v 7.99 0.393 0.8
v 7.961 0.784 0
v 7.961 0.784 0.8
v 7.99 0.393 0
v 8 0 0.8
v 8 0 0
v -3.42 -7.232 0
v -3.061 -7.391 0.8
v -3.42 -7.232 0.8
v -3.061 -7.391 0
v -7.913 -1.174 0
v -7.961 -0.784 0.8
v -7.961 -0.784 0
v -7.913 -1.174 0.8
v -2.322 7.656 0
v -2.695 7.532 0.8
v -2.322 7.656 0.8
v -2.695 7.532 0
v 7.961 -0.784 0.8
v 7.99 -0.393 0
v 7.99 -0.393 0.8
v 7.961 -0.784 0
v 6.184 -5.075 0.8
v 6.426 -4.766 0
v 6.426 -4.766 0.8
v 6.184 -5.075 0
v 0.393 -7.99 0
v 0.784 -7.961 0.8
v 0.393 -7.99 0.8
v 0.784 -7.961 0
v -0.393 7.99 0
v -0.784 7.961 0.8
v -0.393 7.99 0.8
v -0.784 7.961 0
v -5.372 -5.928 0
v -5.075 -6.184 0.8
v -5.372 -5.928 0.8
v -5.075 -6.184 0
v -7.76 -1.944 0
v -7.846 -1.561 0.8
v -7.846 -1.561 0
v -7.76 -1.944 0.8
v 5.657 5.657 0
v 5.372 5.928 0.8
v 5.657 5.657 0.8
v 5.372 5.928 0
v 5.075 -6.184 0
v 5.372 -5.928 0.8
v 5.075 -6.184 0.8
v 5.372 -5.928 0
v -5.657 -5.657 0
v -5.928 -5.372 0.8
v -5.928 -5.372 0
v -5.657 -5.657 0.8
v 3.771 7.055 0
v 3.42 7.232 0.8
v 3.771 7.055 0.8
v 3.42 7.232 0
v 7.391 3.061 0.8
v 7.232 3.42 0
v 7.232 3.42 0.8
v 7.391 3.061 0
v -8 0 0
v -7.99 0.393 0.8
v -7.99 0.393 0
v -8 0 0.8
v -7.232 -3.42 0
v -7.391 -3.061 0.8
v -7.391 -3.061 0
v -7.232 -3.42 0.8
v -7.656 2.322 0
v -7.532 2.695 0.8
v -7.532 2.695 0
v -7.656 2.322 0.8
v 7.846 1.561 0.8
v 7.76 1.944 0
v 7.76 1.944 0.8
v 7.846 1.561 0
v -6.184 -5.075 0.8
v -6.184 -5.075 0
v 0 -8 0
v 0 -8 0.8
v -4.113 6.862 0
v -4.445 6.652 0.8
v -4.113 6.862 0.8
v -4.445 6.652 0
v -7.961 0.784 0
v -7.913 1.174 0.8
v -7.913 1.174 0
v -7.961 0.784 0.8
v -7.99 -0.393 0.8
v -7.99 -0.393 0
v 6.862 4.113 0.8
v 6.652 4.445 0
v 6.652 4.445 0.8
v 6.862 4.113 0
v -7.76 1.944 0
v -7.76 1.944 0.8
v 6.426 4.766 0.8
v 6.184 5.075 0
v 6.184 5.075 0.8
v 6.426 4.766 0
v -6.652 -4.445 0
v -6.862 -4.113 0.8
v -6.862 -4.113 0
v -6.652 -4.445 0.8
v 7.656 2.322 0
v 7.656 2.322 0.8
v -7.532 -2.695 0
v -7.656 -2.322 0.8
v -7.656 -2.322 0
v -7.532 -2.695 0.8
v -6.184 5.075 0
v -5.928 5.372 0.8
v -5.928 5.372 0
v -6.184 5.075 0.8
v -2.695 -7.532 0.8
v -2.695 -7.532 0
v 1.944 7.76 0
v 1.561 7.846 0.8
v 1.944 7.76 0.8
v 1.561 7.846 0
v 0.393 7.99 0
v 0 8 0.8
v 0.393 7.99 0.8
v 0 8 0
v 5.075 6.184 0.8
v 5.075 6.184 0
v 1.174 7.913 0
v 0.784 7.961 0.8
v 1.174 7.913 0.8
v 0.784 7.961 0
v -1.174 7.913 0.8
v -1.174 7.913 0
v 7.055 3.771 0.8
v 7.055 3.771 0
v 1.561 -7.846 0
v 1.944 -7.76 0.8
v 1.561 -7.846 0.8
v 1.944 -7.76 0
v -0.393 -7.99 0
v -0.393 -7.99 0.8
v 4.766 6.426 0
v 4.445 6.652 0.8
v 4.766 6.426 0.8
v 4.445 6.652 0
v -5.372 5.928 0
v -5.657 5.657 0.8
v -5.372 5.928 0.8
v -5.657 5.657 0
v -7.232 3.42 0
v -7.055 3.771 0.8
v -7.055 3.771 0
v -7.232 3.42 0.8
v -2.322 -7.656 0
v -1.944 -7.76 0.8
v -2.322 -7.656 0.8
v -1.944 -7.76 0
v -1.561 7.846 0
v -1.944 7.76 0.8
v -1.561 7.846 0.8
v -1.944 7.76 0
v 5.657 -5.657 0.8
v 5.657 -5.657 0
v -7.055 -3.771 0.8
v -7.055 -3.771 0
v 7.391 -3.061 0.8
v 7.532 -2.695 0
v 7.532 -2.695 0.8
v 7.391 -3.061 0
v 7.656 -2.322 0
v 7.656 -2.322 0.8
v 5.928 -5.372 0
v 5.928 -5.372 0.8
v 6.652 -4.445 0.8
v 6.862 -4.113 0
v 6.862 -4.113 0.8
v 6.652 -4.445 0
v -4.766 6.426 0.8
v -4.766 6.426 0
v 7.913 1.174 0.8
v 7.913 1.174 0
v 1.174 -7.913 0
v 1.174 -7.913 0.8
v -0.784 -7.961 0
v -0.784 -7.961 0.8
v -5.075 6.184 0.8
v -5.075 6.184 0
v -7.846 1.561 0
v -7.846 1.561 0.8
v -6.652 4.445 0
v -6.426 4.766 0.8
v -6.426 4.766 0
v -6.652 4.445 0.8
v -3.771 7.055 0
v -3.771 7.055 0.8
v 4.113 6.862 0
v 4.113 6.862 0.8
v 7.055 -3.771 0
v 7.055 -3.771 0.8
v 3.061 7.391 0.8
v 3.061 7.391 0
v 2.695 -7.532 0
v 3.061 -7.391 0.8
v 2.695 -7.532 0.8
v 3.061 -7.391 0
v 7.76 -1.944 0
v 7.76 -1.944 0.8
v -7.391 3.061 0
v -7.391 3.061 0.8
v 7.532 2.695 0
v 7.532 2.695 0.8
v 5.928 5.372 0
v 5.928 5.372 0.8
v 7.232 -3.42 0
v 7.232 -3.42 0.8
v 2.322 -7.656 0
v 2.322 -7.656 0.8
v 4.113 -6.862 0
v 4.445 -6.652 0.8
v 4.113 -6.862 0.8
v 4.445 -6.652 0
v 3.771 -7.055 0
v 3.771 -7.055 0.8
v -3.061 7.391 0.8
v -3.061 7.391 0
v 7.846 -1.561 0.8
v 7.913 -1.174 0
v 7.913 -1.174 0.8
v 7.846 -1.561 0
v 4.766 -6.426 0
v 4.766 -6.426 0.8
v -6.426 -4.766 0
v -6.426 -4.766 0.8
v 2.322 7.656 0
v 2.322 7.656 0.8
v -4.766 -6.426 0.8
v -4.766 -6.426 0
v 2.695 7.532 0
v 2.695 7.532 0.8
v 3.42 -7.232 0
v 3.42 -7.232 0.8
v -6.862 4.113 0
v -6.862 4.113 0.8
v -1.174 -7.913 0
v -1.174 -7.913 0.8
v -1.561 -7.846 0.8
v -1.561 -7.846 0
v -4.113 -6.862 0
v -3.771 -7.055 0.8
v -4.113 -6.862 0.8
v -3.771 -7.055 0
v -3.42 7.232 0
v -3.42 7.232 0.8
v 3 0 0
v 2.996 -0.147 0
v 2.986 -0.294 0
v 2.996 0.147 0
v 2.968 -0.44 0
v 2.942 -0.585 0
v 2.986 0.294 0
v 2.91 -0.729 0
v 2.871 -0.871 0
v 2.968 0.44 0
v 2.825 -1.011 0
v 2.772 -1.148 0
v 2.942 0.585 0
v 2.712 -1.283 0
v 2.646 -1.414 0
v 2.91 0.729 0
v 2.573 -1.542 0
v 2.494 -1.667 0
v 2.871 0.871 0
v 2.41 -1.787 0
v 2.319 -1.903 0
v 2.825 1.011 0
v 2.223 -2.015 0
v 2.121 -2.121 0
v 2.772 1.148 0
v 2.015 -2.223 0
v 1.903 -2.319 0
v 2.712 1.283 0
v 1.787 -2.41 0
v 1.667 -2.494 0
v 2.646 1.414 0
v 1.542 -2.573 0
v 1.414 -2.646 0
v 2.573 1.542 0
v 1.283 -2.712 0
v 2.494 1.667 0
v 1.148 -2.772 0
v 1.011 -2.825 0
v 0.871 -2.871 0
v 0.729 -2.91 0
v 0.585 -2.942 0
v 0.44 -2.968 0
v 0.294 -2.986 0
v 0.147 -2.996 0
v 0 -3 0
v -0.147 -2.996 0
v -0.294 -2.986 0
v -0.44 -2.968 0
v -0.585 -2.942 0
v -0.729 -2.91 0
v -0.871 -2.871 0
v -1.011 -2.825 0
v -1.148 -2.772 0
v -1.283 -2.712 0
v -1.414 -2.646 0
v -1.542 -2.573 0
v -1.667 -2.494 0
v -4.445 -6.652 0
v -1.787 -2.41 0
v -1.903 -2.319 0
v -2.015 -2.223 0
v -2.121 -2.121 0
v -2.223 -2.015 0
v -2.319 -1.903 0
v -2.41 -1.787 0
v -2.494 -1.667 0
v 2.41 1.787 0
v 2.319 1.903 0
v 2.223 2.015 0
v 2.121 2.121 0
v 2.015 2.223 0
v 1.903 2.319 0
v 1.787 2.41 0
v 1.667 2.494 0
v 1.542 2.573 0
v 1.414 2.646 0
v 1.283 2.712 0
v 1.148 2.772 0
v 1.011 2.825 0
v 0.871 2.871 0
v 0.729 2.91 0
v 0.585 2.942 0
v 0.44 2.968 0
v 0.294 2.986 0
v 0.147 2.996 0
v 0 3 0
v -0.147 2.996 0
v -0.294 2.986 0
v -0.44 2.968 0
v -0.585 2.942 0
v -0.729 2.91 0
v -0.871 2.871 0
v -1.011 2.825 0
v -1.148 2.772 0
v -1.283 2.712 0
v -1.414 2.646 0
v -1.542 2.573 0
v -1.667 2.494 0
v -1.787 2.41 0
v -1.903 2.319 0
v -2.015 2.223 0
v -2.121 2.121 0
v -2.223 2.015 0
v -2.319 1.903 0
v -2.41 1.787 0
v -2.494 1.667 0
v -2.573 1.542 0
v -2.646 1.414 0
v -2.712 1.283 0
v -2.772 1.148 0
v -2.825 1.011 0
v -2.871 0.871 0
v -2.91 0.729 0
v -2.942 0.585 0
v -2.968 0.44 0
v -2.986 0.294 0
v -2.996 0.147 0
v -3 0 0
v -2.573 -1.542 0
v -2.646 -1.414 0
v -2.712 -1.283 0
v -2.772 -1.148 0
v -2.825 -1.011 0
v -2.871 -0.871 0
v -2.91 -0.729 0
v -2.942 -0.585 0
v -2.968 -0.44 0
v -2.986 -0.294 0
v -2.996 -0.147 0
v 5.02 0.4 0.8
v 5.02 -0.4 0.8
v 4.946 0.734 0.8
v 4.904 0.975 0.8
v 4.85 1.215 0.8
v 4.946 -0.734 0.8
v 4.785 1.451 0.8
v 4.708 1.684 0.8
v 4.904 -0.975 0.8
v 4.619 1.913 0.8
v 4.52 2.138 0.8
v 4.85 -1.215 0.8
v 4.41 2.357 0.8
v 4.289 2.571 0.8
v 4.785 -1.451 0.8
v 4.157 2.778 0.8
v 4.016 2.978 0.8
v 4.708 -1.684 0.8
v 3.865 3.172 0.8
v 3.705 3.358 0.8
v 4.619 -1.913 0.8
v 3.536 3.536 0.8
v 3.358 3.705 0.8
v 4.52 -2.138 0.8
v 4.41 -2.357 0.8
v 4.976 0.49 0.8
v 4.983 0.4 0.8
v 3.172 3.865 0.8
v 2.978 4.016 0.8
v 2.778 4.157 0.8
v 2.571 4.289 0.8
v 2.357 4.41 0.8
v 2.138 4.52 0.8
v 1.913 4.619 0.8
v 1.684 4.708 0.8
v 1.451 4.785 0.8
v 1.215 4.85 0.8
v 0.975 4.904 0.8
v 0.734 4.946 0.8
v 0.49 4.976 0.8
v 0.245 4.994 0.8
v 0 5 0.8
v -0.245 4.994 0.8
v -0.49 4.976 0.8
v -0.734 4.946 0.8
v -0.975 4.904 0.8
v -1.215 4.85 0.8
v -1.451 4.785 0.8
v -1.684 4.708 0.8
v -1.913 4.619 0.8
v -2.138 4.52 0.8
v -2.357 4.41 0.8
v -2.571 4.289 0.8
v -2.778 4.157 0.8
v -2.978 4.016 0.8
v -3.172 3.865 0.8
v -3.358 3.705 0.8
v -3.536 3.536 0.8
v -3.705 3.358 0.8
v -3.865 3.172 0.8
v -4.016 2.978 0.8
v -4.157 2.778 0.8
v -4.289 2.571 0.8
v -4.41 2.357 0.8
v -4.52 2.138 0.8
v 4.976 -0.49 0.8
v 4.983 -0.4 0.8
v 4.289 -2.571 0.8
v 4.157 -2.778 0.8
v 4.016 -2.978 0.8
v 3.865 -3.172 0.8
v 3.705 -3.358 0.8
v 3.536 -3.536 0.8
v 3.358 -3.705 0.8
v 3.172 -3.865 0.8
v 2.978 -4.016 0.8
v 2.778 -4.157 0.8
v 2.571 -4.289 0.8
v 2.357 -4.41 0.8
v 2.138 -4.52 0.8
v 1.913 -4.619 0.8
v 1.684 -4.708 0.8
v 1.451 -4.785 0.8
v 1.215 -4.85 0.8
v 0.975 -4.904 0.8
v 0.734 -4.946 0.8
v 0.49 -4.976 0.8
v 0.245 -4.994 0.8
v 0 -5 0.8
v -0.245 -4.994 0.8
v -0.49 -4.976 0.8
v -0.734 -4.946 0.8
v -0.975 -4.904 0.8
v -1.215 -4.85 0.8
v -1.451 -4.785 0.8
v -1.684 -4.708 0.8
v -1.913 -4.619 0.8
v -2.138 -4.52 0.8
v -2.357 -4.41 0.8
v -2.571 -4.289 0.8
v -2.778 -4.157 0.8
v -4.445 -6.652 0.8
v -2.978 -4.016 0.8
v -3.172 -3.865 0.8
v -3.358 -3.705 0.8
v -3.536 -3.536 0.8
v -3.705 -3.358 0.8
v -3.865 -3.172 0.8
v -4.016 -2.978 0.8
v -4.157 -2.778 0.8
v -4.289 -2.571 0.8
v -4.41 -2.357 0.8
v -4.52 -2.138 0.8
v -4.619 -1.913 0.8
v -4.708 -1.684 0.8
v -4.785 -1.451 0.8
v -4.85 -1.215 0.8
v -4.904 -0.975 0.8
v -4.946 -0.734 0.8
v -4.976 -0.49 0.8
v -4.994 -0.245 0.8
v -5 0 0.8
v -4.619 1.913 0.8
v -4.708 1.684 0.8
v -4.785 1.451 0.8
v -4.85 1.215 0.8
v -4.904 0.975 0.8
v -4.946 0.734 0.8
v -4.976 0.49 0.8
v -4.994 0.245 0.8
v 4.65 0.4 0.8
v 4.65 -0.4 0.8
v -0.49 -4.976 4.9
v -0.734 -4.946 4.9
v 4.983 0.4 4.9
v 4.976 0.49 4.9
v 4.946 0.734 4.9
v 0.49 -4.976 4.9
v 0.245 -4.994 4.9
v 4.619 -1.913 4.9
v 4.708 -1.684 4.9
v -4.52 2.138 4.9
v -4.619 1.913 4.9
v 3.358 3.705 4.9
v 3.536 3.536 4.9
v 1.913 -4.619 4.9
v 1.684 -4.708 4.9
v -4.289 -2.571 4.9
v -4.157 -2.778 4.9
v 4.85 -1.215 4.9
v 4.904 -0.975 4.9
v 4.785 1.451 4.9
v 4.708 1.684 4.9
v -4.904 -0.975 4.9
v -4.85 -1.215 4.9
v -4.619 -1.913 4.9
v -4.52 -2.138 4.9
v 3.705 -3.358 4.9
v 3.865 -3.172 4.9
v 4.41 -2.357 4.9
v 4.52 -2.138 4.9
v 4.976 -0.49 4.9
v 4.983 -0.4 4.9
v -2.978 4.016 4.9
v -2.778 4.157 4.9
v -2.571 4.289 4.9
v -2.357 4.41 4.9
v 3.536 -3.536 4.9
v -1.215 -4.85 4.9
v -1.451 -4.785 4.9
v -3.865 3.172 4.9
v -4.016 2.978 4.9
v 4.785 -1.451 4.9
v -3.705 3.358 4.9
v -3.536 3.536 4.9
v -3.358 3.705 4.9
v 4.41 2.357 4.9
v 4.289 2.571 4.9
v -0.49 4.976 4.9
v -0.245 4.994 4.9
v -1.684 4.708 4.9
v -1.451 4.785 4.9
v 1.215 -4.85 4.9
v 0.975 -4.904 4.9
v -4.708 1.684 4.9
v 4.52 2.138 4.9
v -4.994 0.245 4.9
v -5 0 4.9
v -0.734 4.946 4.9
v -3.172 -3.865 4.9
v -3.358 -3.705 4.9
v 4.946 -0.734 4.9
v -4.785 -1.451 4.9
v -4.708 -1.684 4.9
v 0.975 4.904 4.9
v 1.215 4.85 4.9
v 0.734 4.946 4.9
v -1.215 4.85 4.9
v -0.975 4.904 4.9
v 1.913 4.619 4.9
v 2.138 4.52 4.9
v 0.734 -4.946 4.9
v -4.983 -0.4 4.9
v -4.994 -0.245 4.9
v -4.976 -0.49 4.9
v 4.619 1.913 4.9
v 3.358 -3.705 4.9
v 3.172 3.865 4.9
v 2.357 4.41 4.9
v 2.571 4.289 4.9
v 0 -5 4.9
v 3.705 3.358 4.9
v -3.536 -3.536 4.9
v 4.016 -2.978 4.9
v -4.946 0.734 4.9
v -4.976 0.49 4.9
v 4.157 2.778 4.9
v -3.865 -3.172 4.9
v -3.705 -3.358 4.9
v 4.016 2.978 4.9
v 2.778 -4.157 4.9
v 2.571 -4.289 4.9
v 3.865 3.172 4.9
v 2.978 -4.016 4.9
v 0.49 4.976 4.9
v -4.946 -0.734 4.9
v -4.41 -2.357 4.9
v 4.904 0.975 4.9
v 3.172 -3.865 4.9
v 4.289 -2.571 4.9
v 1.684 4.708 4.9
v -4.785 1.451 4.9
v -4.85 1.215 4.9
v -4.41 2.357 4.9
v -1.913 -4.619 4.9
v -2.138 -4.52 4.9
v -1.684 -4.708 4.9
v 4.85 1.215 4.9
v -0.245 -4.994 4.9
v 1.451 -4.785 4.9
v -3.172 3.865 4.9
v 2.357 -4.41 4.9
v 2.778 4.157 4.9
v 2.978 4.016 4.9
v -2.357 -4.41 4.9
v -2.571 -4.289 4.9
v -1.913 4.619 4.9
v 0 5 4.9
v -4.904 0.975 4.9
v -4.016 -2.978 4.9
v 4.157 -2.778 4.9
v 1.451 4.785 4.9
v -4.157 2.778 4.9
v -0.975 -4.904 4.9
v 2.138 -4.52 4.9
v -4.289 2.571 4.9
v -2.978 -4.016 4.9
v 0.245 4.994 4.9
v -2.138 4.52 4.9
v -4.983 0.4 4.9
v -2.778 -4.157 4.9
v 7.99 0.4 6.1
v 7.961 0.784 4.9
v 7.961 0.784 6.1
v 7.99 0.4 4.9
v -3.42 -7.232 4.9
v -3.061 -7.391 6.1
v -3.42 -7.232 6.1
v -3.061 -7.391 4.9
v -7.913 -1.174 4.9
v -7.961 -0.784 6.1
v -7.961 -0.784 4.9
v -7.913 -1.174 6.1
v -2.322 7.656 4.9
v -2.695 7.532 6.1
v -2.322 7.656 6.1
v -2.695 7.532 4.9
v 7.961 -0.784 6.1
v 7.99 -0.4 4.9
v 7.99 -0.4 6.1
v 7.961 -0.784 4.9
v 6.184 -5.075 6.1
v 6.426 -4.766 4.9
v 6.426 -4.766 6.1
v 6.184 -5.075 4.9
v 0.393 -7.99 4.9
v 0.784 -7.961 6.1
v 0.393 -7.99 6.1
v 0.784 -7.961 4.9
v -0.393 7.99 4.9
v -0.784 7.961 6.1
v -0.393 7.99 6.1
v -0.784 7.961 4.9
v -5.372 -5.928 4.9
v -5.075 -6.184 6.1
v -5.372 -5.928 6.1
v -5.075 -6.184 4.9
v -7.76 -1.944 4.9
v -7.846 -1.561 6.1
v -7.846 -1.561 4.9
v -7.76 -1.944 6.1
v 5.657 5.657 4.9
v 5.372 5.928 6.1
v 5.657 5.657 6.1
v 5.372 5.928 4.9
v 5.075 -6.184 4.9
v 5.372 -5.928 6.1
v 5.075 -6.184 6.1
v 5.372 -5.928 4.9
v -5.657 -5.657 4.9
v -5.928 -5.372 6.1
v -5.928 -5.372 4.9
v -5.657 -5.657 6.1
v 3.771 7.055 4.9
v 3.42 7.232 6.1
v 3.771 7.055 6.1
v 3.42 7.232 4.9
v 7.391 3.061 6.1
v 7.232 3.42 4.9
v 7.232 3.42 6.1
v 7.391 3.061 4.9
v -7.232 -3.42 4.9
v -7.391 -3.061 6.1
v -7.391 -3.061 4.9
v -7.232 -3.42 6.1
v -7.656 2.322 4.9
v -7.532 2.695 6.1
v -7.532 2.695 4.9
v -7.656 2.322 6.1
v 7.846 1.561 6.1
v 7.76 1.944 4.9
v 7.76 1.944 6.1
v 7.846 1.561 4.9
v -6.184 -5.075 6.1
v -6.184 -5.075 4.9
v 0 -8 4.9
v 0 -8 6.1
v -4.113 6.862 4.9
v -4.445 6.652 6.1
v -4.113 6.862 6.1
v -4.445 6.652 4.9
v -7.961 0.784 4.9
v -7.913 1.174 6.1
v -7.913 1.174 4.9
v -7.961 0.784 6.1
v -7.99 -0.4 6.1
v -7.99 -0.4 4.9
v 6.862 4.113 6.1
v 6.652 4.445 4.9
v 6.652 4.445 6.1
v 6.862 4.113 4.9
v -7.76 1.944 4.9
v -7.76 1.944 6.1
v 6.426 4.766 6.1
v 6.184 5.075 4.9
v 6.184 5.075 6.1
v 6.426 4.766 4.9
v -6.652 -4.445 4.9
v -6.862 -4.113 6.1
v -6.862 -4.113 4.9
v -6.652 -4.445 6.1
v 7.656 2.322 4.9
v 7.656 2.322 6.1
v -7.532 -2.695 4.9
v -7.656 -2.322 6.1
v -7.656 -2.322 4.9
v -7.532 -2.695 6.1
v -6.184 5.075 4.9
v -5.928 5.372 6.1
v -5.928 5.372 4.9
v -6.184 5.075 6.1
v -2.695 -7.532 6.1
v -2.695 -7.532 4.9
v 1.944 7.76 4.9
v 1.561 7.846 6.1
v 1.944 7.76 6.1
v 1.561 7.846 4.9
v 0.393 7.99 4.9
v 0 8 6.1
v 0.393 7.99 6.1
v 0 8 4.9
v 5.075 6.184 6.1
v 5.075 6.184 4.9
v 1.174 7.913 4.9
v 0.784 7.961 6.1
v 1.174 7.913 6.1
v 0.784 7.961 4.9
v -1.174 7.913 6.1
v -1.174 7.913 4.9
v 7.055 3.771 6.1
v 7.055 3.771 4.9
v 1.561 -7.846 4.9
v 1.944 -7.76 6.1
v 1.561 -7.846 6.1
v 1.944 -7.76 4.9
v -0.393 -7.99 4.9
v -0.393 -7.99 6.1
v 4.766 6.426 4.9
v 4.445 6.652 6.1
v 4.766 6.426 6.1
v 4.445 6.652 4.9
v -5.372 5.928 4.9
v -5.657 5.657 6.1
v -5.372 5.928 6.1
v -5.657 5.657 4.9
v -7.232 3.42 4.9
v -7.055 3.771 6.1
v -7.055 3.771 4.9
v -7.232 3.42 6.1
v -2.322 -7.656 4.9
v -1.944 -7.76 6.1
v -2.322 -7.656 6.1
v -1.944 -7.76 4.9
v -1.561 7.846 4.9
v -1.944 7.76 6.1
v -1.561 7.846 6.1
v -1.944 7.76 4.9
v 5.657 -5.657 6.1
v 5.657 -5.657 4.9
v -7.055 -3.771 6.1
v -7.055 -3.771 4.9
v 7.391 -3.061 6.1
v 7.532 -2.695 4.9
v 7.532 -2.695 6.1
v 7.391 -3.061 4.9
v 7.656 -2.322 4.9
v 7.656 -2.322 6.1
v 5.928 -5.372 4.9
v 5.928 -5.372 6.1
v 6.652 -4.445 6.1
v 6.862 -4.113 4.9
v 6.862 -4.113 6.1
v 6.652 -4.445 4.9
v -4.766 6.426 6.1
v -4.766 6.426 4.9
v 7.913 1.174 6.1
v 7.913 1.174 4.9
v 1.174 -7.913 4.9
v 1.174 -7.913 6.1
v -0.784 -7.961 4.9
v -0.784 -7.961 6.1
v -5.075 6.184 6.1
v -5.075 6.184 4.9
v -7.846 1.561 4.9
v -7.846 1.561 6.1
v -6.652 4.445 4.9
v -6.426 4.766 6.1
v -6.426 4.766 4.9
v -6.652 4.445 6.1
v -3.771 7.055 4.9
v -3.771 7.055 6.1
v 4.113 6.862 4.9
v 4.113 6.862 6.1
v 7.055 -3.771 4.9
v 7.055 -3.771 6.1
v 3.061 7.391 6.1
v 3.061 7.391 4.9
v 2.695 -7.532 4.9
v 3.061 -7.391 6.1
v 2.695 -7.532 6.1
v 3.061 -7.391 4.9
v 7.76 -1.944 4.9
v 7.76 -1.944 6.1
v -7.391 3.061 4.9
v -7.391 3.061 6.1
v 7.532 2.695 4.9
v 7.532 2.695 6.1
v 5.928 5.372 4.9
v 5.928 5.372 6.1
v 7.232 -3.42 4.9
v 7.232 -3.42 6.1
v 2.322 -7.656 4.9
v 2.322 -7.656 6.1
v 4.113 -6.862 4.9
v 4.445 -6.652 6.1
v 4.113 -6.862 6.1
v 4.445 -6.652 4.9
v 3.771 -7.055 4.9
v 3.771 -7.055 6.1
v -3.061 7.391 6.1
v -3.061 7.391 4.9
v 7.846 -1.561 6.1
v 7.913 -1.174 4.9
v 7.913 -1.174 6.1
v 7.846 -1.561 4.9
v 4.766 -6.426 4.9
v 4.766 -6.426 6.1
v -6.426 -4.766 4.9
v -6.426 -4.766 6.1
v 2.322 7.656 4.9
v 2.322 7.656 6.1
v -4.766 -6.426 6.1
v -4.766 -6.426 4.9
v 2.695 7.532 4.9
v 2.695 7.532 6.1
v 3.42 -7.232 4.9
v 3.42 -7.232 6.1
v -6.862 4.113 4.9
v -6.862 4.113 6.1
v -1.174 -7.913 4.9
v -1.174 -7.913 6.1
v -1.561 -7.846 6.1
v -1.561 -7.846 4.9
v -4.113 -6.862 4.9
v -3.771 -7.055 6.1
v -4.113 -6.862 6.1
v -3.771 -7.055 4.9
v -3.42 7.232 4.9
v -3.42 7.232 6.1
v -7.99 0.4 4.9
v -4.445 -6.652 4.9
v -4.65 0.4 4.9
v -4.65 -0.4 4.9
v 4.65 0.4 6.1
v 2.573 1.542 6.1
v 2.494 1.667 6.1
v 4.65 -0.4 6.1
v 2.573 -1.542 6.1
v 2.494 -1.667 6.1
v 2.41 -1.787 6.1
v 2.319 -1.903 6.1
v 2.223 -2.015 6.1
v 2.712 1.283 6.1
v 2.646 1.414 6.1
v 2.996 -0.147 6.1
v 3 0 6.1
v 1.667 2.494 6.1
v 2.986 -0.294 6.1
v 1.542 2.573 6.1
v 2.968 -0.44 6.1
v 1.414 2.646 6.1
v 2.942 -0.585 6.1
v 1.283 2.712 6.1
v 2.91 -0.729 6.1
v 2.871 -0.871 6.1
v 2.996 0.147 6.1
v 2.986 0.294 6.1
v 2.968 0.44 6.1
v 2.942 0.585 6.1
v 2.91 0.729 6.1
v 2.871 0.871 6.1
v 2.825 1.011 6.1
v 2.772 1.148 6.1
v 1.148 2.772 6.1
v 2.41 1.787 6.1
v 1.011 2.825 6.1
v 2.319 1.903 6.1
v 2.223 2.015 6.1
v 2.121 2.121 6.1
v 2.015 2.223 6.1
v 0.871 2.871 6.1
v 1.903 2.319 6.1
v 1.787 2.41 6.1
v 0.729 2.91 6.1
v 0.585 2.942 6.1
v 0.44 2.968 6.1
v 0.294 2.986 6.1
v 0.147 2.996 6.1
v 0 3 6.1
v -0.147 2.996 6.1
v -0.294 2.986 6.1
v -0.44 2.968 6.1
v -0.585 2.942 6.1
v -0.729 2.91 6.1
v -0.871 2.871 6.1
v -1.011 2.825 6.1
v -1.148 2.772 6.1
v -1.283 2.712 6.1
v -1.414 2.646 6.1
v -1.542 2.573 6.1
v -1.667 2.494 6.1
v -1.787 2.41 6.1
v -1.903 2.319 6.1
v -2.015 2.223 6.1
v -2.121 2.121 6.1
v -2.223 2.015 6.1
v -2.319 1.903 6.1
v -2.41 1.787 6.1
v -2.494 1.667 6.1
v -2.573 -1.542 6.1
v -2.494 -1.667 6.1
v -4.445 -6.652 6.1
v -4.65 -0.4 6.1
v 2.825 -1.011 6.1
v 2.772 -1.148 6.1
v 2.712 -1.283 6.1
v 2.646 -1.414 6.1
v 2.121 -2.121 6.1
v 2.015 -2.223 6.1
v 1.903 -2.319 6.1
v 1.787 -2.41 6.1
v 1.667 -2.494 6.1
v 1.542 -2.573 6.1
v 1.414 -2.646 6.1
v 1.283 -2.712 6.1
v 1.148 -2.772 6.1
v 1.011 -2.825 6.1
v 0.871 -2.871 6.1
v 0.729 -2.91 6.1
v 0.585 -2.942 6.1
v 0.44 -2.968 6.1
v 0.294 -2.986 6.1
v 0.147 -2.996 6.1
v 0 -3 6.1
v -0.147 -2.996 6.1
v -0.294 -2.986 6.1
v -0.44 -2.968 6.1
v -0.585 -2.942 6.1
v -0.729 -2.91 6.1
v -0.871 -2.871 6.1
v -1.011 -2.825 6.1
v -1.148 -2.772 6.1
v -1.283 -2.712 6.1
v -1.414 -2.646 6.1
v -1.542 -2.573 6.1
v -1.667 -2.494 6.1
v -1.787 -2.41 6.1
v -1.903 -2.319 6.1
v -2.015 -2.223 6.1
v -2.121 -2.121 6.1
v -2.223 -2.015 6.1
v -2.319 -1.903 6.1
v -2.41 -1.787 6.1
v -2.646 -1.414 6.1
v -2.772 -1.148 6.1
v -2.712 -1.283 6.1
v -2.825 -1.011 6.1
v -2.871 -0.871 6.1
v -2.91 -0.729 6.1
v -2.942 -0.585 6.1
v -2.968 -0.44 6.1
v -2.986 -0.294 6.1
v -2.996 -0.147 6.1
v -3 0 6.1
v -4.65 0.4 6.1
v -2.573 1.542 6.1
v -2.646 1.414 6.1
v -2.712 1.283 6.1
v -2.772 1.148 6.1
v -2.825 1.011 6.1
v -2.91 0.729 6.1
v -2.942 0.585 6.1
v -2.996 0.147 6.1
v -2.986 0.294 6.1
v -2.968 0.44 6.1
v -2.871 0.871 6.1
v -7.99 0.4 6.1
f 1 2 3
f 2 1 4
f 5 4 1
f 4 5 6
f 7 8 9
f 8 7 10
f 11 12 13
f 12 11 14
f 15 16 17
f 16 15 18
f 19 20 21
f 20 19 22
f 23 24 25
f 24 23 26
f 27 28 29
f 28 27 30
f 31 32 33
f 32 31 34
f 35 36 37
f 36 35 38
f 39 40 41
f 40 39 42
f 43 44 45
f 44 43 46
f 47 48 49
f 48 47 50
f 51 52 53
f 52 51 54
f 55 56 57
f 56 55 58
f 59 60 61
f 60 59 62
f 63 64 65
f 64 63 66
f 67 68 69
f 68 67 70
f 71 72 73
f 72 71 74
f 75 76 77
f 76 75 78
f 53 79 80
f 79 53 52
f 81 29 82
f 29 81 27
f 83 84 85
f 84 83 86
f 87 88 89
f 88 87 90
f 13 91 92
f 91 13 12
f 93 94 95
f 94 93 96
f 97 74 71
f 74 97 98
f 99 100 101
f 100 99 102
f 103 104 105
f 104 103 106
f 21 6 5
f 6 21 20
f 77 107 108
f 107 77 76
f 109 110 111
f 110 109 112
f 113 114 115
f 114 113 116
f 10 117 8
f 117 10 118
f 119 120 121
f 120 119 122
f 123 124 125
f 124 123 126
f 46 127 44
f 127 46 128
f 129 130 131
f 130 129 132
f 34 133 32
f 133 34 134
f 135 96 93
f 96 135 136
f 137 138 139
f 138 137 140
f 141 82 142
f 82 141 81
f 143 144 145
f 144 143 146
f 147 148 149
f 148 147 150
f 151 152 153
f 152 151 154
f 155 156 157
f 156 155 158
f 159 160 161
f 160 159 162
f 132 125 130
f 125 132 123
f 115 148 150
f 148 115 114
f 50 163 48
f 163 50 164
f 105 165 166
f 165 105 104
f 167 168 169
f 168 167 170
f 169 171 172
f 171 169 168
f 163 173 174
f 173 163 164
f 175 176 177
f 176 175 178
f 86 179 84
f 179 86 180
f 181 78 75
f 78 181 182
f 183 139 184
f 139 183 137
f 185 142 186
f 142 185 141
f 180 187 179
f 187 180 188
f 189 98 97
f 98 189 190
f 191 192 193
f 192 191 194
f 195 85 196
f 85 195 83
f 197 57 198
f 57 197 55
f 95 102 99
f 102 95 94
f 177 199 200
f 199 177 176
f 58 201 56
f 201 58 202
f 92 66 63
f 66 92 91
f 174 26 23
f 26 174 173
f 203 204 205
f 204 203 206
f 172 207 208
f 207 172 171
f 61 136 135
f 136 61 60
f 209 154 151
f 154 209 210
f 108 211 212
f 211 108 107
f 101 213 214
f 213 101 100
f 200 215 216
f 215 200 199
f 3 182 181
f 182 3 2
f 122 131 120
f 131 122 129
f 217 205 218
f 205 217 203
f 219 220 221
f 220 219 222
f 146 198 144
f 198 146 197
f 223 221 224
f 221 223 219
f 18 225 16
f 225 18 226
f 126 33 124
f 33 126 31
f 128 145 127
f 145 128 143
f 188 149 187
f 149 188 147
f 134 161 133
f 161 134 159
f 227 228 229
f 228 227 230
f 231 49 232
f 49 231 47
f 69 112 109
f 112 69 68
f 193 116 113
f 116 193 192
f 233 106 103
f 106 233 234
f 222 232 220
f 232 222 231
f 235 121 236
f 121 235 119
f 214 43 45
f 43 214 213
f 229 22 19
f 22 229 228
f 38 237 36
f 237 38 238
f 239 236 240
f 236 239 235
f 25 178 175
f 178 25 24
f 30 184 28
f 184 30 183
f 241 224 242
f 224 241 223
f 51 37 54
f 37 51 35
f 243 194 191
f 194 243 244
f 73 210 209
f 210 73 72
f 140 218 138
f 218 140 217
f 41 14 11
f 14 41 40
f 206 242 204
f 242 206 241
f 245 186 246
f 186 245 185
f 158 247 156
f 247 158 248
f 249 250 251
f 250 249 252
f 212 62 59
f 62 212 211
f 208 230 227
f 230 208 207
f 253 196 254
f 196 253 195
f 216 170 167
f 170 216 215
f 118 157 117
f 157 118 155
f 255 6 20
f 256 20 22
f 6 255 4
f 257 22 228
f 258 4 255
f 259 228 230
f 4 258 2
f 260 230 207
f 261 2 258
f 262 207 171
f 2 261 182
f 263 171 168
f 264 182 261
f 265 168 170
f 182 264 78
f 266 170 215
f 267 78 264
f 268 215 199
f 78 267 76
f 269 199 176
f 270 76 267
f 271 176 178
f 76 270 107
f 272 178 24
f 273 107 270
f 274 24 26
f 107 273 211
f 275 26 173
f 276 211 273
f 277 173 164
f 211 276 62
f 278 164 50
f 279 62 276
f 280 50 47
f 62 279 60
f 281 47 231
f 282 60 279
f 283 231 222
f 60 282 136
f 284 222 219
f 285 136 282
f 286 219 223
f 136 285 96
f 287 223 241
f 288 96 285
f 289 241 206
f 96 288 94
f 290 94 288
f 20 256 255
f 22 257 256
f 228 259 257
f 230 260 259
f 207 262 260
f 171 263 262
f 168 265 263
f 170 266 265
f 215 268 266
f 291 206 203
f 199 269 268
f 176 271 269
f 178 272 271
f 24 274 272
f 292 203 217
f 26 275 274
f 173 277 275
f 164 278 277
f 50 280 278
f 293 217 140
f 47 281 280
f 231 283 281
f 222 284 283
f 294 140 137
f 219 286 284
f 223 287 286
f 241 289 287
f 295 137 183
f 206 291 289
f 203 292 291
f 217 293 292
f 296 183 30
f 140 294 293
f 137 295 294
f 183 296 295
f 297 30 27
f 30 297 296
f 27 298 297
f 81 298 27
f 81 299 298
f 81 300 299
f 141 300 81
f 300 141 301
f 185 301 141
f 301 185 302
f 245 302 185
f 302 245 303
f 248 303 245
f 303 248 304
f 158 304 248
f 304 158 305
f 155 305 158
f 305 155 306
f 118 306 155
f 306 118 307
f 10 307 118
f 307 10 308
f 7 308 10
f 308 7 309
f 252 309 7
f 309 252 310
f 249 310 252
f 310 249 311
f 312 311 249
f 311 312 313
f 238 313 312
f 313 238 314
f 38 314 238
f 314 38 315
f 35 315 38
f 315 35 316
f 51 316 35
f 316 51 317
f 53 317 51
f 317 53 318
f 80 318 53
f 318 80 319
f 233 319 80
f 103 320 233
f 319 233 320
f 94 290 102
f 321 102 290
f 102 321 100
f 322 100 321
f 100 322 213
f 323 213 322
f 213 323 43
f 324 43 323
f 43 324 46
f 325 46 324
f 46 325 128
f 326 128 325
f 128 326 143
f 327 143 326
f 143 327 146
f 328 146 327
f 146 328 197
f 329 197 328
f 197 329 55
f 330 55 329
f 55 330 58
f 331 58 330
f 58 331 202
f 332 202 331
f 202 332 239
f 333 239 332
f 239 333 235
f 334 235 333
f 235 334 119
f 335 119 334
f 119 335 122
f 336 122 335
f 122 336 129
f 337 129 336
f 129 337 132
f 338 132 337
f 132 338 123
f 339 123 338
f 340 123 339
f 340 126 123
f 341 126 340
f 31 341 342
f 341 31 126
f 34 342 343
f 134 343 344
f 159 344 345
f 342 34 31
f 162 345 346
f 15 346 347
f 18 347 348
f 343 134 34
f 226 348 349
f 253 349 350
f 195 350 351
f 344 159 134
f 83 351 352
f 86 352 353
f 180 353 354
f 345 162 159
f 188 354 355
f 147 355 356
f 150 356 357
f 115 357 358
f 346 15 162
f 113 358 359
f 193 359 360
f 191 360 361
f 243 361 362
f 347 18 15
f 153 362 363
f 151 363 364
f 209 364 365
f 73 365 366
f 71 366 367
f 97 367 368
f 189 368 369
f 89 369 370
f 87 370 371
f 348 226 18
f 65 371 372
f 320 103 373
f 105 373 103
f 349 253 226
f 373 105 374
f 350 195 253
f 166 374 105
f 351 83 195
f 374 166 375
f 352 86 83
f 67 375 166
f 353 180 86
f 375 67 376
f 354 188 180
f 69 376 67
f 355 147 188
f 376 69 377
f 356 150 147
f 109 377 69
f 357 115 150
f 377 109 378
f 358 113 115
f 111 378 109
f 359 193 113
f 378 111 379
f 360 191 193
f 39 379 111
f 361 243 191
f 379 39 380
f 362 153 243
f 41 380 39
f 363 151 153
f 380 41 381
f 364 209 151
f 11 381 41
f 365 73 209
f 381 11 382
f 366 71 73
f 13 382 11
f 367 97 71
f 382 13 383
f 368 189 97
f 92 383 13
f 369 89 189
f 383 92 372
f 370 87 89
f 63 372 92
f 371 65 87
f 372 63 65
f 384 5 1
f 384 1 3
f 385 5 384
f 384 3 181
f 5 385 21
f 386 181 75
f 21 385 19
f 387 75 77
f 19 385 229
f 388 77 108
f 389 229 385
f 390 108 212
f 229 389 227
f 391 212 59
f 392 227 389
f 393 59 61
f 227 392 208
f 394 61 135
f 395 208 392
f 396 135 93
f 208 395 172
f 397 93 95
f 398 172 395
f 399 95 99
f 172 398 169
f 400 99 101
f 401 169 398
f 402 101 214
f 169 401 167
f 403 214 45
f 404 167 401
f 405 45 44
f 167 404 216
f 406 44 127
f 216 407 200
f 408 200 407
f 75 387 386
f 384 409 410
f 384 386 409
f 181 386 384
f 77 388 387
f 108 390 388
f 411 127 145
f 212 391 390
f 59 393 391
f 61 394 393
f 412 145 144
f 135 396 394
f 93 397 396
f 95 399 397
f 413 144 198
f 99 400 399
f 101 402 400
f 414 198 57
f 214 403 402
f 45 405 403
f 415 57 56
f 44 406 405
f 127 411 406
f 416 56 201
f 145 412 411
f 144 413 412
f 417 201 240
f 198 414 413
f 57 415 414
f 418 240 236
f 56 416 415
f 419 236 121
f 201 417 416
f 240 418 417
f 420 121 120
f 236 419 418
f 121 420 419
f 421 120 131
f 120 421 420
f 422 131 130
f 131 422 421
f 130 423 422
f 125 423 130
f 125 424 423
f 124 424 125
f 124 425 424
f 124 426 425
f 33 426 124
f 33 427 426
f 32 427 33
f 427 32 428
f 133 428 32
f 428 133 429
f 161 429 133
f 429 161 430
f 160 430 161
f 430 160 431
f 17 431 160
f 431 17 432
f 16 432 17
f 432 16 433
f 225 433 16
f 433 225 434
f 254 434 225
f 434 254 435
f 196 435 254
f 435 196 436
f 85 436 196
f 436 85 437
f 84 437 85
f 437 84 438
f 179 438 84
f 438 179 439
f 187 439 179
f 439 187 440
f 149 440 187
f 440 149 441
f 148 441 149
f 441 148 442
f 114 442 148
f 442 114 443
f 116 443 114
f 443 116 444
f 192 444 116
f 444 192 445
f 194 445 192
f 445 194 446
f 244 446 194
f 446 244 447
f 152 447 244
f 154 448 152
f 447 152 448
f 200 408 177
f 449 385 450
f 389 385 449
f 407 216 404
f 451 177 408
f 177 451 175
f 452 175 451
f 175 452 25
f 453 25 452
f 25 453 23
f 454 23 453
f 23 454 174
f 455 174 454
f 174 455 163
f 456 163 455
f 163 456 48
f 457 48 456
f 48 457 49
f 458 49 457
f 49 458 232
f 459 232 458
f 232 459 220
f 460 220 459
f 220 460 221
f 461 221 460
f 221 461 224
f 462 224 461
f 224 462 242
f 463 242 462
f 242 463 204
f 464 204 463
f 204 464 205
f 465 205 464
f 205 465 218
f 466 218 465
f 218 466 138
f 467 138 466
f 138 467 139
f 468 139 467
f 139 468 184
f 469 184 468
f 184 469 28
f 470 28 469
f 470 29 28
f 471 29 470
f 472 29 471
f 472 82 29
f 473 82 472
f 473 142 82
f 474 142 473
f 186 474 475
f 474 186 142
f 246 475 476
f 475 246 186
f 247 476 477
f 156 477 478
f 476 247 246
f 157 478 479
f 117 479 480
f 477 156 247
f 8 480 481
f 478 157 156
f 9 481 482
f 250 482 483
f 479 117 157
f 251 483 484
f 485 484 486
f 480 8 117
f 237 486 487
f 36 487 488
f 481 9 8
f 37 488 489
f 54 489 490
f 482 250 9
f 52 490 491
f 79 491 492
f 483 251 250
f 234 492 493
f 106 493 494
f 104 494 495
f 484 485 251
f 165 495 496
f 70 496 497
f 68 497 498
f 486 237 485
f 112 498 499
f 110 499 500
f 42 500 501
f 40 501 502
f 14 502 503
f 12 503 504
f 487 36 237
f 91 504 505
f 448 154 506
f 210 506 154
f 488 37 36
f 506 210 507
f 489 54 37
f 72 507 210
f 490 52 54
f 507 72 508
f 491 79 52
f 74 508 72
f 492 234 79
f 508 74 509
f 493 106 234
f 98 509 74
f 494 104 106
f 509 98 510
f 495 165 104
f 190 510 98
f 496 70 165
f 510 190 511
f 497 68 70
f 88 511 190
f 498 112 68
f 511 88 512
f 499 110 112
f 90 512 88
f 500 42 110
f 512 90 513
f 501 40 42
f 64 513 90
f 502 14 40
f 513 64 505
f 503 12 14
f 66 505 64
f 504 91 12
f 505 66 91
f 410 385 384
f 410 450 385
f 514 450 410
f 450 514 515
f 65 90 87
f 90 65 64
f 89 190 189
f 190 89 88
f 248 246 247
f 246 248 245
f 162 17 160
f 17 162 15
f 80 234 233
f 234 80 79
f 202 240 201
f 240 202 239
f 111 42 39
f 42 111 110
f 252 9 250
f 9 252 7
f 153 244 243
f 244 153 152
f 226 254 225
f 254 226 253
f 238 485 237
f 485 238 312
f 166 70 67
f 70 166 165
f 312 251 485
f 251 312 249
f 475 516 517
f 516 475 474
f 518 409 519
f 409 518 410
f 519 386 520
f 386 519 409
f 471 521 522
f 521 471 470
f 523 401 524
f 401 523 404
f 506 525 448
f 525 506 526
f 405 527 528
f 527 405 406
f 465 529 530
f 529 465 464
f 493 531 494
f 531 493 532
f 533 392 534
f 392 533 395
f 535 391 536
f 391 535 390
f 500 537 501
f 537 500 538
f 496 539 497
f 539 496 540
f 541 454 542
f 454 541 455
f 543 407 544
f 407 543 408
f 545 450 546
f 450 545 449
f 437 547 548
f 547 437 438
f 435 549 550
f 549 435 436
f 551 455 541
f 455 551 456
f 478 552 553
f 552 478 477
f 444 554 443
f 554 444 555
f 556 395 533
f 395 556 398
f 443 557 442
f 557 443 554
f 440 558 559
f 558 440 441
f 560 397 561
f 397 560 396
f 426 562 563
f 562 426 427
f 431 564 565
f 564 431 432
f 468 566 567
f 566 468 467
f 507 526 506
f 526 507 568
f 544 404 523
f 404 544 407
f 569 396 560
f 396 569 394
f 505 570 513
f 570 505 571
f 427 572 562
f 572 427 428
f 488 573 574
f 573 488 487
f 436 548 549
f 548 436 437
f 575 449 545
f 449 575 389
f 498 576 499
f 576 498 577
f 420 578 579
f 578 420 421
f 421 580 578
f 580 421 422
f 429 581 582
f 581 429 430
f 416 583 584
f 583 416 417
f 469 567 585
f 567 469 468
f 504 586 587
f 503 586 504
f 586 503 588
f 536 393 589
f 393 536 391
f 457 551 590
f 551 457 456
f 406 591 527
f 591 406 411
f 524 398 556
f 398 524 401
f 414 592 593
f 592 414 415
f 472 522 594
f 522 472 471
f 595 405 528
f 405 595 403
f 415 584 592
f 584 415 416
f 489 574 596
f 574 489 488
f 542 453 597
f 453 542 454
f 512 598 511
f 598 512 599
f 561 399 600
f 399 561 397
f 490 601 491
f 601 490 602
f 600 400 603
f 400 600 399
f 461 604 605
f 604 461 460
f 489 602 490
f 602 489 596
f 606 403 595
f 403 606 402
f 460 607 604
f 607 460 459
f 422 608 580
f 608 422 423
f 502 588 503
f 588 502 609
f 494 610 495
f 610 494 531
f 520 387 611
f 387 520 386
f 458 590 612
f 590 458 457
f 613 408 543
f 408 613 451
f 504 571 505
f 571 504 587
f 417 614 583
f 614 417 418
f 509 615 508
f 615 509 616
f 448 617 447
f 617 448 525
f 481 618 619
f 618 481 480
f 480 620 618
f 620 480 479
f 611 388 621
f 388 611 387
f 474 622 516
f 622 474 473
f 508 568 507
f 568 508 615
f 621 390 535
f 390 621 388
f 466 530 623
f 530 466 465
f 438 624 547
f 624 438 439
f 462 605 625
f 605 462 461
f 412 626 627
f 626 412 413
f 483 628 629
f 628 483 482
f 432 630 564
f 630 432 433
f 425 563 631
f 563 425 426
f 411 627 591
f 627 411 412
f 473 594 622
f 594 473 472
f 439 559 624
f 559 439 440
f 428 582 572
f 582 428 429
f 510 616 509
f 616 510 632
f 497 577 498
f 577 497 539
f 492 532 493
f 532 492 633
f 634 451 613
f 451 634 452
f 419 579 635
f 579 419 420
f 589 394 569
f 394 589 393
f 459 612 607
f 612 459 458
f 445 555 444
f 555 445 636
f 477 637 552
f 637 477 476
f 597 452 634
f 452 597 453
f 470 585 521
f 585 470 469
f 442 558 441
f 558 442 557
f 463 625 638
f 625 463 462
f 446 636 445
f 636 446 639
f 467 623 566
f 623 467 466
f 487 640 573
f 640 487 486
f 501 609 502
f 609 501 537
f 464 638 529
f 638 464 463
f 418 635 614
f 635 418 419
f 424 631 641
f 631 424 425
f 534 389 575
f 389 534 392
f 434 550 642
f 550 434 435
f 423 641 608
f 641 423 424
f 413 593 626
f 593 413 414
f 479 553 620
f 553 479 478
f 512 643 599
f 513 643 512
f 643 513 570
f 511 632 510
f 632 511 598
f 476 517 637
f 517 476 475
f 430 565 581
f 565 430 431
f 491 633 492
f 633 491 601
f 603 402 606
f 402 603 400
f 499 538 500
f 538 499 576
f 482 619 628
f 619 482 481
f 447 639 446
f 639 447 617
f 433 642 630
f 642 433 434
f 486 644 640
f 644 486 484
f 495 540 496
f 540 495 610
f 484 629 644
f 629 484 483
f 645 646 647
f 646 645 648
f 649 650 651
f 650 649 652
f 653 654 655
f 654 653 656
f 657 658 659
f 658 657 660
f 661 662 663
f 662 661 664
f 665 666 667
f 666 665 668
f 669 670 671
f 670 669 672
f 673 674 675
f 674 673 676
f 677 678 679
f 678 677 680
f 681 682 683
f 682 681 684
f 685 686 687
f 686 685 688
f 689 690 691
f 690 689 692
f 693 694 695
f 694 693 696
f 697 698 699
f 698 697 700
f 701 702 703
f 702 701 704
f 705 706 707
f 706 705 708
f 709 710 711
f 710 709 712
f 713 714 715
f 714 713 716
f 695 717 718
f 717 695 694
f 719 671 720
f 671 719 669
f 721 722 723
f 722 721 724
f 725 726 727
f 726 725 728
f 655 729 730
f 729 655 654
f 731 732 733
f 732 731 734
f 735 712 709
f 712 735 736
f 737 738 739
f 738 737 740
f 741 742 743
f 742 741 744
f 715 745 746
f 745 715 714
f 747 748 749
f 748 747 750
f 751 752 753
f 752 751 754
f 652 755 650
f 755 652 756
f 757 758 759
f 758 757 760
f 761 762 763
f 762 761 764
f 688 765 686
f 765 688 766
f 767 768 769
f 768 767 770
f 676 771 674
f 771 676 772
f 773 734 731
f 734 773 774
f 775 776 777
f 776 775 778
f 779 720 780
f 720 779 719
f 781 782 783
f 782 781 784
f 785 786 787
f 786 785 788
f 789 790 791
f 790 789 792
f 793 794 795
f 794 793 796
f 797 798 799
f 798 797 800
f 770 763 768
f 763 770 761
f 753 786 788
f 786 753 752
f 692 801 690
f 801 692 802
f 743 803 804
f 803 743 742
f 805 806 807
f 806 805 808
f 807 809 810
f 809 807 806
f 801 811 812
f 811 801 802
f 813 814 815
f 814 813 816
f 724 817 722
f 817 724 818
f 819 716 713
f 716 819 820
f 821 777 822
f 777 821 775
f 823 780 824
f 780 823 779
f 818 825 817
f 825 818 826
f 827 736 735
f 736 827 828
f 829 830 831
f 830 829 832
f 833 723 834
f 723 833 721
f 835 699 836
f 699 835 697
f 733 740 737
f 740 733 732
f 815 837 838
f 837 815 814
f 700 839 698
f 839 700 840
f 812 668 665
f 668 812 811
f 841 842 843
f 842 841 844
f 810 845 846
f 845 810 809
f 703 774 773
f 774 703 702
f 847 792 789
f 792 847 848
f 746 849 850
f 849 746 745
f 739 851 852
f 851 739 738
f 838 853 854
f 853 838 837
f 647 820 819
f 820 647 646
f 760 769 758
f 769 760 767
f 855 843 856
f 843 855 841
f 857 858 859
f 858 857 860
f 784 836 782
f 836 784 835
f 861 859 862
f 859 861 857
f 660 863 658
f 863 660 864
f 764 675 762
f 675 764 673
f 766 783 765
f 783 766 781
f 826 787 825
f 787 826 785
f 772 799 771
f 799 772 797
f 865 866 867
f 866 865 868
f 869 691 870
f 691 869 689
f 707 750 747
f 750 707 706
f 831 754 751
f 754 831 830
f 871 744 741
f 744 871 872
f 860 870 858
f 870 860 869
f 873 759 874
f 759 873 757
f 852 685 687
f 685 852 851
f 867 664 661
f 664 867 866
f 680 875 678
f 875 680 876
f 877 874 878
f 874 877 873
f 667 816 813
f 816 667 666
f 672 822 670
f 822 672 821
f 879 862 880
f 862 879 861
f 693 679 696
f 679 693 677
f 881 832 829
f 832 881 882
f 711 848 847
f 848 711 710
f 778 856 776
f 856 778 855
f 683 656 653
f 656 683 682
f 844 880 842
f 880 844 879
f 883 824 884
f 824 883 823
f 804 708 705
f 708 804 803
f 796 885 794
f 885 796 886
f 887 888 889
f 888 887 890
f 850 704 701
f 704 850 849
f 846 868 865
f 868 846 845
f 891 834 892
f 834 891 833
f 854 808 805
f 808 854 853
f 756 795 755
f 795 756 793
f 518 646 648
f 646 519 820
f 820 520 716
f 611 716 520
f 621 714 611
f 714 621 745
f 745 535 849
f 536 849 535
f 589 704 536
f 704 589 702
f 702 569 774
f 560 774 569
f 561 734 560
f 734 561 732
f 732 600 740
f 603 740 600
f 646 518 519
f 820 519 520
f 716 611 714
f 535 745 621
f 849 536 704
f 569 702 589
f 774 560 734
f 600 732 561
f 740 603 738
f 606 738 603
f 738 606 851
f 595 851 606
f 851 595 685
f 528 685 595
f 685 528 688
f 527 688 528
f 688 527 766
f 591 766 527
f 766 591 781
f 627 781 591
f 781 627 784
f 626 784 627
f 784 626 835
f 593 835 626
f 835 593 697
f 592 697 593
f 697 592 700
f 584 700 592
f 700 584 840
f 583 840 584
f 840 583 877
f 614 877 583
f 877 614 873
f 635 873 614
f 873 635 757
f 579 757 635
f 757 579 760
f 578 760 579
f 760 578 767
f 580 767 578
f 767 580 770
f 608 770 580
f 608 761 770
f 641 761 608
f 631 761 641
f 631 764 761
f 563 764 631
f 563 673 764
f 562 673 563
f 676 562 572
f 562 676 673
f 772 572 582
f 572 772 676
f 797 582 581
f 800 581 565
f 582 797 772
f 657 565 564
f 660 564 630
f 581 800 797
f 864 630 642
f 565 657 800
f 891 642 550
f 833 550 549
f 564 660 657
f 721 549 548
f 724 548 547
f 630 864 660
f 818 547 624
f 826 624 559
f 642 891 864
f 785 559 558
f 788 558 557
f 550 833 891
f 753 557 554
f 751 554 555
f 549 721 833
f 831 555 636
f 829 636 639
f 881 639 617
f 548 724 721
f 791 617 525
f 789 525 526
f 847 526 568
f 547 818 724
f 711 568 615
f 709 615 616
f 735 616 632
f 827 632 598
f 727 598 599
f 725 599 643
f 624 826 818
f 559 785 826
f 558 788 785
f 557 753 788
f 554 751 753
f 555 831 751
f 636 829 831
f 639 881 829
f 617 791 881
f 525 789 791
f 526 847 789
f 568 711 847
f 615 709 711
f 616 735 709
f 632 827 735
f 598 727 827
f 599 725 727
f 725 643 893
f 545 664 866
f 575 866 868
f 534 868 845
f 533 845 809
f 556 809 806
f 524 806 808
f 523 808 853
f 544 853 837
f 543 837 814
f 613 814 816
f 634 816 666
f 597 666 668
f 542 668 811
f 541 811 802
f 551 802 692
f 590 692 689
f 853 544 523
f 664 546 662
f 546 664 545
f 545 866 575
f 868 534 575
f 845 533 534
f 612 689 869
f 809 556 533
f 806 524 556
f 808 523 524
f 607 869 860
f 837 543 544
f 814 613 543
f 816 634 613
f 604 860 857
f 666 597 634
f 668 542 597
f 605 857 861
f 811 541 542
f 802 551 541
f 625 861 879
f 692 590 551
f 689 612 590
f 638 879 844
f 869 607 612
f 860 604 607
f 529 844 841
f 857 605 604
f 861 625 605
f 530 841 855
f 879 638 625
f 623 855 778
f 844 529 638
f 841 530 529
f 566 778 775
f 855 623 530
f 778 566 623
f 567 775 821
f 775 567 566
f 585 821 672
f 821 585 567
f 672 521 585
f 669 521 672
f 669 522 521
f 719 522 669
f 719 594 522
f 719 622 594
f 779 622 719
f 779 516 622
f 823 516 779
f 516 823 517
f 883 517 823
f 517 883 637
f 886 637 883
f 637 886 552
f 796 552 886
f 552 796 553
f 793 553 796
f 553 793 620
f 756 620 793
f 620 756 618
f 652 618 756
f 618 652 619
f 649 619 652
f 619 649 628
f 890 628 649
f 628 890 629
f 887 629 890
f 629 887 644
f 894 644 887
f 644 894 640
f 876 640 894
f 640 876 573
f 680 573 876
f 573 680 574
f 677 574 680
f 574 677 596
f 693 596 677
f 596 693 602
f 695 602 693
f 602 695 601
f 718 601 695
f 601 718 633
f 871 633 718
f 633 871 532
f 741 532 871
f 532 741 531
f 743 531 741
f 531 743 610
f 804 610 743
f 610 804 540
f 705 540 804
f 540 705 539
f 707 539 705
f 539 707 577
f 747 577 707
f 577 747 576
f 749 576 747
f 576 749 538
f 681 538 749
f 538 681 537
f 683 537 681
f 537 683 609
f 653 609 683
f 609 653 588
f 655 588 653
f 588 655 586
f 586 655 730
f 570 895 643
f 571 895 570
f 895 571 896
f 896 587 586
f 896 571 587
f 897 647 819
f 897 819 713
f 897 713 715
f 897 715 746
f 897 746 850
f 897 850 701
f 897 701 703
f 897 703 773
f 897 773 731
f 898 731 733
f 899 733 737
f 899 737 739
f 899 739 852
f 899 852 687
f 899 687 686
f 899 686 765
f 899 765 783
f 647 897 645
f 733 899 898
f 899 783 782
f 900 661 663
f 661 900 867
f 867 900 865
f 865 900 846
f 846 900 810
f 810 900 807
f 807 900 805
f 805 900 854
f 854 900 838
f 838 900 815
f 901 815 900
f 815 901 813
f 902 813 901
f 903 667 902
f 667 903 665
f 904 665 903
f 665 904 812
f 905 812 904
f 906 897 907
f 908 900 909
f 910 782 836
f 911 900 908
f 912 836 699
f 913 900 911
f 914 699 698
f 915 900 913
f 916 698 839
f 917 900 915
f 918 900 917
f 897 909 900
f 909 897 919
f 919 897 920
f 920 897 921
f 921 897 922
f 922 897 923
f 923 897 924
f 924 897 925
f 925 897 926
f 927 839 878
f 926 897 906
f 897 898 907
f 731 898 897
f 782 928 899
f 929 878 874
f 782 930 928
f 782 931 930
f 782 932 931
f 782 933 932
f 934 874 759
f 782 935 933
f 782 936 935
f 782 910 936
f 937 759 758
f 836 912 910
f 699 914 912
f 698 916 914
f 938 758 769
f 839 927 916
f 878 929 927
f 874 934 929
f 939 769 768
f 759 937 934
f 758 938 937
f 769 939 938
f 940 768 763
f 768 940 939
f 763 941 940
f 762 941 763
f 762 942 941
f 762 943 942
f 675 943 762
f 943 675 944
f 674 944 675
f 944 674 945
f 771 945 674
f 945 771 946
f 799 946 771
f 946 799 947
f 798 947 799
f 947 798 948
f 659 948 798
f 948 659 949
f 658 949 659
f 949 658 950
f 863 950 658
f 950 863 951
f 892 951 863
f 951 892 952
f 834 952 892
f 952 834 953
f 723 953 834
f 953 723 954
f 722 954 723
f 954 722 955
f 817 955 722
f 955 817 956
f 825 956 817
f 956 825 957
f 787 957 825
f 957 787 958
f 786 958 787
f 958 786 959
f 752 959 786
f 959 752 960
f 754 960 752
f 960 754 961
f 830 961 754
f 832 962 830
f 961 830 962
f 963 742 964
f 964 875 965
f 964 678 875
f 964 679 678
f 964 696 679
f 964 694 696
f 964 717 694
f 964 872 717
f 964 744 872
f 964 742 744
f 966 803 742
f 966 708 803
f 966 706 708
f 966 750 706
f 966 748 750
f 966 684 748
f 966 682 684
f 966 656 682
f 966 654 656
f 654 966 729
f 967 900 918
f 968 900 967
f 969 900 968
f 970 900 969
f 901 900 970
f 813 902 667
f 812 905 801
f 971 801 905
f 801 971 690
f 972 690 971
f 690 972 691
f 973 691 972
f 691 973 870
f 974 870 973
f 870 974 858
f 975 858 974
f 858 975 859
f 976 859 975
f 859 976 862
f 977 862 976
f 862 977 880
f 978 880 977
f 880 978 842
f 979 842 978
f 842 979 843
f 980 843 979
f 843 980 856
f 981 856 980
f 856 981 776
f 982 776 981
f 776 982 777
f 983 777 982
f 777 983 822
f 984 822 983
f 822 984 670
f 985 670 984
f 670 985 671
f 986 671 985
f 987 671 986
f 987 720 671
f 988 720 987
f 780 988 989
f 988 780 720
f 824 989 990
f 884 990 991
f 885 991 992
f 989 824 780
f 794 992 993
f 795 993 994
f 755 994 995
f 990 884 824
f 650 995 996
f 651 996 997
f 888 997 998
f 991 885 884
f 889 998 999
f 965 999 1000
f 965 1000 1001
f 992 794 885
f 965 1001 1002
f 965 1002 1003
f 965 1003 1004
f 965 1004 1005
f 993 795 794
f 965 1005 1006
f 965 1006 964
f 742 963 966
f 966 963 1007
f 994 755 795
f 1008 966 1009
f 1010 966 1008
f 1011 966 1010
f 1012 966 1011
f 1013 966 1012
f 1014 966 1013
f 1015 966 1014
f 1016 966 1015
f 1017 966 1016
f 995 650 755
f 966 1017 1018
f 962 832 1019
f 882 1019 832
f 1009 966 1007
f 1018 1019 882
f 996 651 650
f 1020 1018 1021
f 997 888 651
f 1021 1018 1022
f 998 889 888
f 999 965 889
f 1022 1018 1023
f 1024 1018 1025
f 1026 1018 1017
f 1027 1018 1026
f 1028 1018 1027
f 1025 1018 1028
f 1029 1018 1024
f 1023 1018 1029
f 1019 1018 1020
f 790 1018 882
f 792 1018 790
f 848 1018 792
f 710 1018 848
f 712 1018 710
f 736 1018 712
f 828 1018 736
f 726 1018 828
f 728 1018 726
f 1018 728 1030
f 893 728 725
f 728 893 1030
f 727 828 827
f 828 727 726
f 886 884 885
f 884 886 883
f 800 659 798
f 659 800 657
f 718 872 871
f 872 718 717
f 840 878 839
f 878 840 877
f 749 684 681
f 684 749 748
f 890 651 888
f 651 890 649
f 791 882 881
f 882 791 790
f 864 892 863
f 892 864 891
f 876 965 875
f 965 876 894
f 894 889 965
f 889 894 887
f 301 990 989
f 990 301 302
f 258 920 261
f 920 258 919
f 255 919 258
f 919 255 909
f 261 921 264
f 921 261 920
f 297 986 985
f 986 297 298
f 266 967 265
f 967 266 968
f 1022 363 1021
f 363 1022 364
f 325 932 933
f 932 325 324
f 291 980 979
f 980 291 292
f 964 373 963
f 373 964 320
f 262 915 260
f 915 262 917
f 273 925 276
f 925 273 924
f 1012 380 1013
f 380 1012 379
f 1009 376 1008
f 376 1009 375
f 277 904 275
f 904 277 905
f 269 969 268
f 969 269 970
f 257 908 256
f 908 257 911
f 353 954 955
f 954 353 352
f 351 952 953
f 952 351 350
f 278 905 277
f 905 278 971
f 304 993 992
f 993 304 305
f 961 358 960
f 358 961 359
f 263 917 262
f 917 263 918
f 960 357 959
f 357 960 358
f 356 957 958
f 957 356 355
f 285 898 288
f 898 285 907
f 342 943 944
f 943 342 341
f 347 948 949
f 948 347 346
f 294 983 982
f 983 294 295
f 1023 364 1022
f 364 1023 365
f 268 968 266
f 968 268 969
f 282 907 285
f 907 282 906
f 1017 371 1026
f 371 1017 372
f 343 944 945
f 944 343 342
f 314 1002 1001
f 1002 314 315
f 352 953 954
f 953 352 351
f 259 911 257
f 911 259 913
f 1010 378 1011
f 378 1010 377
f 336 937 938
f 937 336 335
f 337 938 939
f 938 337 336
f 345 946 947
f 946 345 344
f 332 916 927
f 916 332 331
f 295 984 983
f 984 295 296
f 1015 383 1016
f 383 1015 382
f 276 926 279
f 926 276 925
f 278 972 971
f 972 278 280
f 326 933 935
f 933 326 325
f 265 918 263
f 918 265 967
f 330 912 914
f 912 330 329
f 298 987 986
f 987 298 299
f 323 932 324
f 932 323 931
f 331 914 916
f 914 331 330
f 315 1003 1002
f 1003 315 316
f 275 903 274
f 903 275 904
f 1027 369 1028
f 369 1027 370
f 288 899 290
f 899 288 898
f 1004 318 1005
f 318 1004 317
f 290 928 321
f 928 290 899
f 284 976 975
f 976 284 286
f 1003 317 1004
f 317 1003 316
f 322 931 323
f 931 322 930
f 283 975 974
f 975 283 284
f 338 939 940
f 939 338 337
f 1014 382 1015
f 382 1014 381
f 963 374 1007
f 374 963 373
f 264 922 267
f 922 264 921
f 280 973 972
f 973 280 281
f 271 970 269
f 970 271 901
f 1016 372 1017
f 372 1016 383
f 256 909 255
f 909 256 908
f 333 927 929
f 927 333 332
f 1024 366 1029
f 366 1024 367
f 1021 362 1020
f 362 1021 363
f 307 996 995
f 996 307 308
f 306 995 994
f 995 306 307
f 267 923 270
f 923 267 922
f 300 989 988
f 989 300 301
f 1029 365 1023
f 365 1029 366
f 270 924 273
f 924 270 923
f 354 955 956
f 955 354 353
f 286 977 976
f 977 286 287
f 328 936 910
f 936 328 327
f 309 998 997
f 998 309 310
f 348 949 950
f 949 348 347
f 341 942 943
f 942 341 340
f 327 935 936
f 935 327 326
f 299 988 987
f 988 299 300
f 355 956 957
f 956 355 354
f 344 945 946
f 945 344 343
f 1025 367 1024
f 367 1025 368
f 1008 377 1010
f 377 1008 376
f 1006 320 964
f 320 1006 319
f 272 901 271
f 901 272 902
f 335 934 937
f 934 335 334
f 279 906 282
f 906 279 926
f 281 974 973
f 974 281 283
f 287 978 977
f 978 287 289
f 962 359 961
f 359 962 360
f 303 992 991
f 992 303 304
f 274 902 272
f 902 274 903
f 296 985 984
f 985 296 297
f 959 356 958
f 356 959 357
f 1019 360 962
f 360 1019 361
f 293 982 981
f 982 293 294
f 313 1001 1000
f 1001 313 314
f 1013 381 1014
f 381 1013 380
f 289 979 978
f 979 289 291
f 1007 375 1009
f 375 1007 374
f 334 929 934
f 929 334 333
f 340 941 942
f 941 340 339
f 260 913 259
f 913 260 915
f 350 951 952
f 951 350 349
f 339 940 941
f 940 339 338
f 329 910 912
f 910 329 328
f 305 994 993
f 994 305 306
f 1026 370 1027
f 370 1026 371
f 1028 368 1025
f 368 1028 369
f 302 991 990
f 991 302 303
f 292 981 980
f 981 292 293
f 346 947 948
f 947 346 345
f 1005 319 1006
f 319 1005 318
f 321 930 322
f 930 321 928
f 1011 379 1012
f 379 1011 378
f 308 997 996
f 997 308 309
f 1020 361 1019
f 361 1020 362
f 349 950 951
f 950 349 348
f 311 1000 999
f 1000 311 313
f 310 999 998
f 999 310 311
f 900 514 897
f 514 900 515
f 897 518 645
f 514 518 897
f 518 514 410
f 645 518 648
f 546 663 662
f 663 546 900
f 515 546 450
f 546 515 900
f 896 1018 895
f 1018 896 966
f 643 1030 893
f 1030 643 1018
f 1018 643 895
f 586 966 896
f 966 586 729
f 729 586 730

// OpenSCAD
// EDC-BOBBIN-V1 — dimensions in mm. Print with the lower flange on the bed.
$fn = 128;

barrel_diameter = 10;
flange_diameter = 16;
bore_diameter = 6.0; // Try 6.2 only after checking the actual pin and printer.
window_height = 4.10;
lower_flange_height = 0.80;
upper_flange_height = 1.20;
slot_width = 0.80;
lead_groove_depth = 0.35;

eps = 0.02;
barrel_radius = barrel_diameter / 2;
flange_radius = flange_diameter / 2;
upper_flange_z = lower_flange_height + window_height;
total_height = upper_flange_z + upper_flange_height;

assert(barrel_radius - lead_groove_depth > bore_diameter / 2,
       "Lead groove must leave material between the groove and the bore.");
assert(flange_diameter > barrel_diameter, "Flanges must extend beyond the barrel.");

module radial_slot(angle) {
    rotate([0, 0, angle])
        translate([barrel_radius - lead_groove_depth, -slot_width / 2, upper_flange_z])
            cube([flange_radius - barrel_radius + lead_groove_depth + eps,
                  slot_width, upper_flange_height + eps]);
}

difference() {
    union() {
        cylinder(d = flange_diameter, h = lower_flange_height);
        translate([0, 0, lower_flange_height - eps])
            cylinder(d = barrel_diameter, h = window_height + 2 * eps);
        translate([0, 0, upper_flange_z])
            cylinder(d = flange_diameter, h = upper_flange_height);
    }

    translate([0, 0, -eps])
        cylinder(d = bore_diameter, h = total_height + 2 * eps);

    // Start lead rises from the bottom of the winding window into the +X slot.
    translate([barrel_radius - lead_groove_depth, -slot_width / 2, lower_flange_height])
        cube([lead_groove_depth + eps, slot_width, window_height + eps]);

    radial_slot(0);
    radial_slot(180);
}
